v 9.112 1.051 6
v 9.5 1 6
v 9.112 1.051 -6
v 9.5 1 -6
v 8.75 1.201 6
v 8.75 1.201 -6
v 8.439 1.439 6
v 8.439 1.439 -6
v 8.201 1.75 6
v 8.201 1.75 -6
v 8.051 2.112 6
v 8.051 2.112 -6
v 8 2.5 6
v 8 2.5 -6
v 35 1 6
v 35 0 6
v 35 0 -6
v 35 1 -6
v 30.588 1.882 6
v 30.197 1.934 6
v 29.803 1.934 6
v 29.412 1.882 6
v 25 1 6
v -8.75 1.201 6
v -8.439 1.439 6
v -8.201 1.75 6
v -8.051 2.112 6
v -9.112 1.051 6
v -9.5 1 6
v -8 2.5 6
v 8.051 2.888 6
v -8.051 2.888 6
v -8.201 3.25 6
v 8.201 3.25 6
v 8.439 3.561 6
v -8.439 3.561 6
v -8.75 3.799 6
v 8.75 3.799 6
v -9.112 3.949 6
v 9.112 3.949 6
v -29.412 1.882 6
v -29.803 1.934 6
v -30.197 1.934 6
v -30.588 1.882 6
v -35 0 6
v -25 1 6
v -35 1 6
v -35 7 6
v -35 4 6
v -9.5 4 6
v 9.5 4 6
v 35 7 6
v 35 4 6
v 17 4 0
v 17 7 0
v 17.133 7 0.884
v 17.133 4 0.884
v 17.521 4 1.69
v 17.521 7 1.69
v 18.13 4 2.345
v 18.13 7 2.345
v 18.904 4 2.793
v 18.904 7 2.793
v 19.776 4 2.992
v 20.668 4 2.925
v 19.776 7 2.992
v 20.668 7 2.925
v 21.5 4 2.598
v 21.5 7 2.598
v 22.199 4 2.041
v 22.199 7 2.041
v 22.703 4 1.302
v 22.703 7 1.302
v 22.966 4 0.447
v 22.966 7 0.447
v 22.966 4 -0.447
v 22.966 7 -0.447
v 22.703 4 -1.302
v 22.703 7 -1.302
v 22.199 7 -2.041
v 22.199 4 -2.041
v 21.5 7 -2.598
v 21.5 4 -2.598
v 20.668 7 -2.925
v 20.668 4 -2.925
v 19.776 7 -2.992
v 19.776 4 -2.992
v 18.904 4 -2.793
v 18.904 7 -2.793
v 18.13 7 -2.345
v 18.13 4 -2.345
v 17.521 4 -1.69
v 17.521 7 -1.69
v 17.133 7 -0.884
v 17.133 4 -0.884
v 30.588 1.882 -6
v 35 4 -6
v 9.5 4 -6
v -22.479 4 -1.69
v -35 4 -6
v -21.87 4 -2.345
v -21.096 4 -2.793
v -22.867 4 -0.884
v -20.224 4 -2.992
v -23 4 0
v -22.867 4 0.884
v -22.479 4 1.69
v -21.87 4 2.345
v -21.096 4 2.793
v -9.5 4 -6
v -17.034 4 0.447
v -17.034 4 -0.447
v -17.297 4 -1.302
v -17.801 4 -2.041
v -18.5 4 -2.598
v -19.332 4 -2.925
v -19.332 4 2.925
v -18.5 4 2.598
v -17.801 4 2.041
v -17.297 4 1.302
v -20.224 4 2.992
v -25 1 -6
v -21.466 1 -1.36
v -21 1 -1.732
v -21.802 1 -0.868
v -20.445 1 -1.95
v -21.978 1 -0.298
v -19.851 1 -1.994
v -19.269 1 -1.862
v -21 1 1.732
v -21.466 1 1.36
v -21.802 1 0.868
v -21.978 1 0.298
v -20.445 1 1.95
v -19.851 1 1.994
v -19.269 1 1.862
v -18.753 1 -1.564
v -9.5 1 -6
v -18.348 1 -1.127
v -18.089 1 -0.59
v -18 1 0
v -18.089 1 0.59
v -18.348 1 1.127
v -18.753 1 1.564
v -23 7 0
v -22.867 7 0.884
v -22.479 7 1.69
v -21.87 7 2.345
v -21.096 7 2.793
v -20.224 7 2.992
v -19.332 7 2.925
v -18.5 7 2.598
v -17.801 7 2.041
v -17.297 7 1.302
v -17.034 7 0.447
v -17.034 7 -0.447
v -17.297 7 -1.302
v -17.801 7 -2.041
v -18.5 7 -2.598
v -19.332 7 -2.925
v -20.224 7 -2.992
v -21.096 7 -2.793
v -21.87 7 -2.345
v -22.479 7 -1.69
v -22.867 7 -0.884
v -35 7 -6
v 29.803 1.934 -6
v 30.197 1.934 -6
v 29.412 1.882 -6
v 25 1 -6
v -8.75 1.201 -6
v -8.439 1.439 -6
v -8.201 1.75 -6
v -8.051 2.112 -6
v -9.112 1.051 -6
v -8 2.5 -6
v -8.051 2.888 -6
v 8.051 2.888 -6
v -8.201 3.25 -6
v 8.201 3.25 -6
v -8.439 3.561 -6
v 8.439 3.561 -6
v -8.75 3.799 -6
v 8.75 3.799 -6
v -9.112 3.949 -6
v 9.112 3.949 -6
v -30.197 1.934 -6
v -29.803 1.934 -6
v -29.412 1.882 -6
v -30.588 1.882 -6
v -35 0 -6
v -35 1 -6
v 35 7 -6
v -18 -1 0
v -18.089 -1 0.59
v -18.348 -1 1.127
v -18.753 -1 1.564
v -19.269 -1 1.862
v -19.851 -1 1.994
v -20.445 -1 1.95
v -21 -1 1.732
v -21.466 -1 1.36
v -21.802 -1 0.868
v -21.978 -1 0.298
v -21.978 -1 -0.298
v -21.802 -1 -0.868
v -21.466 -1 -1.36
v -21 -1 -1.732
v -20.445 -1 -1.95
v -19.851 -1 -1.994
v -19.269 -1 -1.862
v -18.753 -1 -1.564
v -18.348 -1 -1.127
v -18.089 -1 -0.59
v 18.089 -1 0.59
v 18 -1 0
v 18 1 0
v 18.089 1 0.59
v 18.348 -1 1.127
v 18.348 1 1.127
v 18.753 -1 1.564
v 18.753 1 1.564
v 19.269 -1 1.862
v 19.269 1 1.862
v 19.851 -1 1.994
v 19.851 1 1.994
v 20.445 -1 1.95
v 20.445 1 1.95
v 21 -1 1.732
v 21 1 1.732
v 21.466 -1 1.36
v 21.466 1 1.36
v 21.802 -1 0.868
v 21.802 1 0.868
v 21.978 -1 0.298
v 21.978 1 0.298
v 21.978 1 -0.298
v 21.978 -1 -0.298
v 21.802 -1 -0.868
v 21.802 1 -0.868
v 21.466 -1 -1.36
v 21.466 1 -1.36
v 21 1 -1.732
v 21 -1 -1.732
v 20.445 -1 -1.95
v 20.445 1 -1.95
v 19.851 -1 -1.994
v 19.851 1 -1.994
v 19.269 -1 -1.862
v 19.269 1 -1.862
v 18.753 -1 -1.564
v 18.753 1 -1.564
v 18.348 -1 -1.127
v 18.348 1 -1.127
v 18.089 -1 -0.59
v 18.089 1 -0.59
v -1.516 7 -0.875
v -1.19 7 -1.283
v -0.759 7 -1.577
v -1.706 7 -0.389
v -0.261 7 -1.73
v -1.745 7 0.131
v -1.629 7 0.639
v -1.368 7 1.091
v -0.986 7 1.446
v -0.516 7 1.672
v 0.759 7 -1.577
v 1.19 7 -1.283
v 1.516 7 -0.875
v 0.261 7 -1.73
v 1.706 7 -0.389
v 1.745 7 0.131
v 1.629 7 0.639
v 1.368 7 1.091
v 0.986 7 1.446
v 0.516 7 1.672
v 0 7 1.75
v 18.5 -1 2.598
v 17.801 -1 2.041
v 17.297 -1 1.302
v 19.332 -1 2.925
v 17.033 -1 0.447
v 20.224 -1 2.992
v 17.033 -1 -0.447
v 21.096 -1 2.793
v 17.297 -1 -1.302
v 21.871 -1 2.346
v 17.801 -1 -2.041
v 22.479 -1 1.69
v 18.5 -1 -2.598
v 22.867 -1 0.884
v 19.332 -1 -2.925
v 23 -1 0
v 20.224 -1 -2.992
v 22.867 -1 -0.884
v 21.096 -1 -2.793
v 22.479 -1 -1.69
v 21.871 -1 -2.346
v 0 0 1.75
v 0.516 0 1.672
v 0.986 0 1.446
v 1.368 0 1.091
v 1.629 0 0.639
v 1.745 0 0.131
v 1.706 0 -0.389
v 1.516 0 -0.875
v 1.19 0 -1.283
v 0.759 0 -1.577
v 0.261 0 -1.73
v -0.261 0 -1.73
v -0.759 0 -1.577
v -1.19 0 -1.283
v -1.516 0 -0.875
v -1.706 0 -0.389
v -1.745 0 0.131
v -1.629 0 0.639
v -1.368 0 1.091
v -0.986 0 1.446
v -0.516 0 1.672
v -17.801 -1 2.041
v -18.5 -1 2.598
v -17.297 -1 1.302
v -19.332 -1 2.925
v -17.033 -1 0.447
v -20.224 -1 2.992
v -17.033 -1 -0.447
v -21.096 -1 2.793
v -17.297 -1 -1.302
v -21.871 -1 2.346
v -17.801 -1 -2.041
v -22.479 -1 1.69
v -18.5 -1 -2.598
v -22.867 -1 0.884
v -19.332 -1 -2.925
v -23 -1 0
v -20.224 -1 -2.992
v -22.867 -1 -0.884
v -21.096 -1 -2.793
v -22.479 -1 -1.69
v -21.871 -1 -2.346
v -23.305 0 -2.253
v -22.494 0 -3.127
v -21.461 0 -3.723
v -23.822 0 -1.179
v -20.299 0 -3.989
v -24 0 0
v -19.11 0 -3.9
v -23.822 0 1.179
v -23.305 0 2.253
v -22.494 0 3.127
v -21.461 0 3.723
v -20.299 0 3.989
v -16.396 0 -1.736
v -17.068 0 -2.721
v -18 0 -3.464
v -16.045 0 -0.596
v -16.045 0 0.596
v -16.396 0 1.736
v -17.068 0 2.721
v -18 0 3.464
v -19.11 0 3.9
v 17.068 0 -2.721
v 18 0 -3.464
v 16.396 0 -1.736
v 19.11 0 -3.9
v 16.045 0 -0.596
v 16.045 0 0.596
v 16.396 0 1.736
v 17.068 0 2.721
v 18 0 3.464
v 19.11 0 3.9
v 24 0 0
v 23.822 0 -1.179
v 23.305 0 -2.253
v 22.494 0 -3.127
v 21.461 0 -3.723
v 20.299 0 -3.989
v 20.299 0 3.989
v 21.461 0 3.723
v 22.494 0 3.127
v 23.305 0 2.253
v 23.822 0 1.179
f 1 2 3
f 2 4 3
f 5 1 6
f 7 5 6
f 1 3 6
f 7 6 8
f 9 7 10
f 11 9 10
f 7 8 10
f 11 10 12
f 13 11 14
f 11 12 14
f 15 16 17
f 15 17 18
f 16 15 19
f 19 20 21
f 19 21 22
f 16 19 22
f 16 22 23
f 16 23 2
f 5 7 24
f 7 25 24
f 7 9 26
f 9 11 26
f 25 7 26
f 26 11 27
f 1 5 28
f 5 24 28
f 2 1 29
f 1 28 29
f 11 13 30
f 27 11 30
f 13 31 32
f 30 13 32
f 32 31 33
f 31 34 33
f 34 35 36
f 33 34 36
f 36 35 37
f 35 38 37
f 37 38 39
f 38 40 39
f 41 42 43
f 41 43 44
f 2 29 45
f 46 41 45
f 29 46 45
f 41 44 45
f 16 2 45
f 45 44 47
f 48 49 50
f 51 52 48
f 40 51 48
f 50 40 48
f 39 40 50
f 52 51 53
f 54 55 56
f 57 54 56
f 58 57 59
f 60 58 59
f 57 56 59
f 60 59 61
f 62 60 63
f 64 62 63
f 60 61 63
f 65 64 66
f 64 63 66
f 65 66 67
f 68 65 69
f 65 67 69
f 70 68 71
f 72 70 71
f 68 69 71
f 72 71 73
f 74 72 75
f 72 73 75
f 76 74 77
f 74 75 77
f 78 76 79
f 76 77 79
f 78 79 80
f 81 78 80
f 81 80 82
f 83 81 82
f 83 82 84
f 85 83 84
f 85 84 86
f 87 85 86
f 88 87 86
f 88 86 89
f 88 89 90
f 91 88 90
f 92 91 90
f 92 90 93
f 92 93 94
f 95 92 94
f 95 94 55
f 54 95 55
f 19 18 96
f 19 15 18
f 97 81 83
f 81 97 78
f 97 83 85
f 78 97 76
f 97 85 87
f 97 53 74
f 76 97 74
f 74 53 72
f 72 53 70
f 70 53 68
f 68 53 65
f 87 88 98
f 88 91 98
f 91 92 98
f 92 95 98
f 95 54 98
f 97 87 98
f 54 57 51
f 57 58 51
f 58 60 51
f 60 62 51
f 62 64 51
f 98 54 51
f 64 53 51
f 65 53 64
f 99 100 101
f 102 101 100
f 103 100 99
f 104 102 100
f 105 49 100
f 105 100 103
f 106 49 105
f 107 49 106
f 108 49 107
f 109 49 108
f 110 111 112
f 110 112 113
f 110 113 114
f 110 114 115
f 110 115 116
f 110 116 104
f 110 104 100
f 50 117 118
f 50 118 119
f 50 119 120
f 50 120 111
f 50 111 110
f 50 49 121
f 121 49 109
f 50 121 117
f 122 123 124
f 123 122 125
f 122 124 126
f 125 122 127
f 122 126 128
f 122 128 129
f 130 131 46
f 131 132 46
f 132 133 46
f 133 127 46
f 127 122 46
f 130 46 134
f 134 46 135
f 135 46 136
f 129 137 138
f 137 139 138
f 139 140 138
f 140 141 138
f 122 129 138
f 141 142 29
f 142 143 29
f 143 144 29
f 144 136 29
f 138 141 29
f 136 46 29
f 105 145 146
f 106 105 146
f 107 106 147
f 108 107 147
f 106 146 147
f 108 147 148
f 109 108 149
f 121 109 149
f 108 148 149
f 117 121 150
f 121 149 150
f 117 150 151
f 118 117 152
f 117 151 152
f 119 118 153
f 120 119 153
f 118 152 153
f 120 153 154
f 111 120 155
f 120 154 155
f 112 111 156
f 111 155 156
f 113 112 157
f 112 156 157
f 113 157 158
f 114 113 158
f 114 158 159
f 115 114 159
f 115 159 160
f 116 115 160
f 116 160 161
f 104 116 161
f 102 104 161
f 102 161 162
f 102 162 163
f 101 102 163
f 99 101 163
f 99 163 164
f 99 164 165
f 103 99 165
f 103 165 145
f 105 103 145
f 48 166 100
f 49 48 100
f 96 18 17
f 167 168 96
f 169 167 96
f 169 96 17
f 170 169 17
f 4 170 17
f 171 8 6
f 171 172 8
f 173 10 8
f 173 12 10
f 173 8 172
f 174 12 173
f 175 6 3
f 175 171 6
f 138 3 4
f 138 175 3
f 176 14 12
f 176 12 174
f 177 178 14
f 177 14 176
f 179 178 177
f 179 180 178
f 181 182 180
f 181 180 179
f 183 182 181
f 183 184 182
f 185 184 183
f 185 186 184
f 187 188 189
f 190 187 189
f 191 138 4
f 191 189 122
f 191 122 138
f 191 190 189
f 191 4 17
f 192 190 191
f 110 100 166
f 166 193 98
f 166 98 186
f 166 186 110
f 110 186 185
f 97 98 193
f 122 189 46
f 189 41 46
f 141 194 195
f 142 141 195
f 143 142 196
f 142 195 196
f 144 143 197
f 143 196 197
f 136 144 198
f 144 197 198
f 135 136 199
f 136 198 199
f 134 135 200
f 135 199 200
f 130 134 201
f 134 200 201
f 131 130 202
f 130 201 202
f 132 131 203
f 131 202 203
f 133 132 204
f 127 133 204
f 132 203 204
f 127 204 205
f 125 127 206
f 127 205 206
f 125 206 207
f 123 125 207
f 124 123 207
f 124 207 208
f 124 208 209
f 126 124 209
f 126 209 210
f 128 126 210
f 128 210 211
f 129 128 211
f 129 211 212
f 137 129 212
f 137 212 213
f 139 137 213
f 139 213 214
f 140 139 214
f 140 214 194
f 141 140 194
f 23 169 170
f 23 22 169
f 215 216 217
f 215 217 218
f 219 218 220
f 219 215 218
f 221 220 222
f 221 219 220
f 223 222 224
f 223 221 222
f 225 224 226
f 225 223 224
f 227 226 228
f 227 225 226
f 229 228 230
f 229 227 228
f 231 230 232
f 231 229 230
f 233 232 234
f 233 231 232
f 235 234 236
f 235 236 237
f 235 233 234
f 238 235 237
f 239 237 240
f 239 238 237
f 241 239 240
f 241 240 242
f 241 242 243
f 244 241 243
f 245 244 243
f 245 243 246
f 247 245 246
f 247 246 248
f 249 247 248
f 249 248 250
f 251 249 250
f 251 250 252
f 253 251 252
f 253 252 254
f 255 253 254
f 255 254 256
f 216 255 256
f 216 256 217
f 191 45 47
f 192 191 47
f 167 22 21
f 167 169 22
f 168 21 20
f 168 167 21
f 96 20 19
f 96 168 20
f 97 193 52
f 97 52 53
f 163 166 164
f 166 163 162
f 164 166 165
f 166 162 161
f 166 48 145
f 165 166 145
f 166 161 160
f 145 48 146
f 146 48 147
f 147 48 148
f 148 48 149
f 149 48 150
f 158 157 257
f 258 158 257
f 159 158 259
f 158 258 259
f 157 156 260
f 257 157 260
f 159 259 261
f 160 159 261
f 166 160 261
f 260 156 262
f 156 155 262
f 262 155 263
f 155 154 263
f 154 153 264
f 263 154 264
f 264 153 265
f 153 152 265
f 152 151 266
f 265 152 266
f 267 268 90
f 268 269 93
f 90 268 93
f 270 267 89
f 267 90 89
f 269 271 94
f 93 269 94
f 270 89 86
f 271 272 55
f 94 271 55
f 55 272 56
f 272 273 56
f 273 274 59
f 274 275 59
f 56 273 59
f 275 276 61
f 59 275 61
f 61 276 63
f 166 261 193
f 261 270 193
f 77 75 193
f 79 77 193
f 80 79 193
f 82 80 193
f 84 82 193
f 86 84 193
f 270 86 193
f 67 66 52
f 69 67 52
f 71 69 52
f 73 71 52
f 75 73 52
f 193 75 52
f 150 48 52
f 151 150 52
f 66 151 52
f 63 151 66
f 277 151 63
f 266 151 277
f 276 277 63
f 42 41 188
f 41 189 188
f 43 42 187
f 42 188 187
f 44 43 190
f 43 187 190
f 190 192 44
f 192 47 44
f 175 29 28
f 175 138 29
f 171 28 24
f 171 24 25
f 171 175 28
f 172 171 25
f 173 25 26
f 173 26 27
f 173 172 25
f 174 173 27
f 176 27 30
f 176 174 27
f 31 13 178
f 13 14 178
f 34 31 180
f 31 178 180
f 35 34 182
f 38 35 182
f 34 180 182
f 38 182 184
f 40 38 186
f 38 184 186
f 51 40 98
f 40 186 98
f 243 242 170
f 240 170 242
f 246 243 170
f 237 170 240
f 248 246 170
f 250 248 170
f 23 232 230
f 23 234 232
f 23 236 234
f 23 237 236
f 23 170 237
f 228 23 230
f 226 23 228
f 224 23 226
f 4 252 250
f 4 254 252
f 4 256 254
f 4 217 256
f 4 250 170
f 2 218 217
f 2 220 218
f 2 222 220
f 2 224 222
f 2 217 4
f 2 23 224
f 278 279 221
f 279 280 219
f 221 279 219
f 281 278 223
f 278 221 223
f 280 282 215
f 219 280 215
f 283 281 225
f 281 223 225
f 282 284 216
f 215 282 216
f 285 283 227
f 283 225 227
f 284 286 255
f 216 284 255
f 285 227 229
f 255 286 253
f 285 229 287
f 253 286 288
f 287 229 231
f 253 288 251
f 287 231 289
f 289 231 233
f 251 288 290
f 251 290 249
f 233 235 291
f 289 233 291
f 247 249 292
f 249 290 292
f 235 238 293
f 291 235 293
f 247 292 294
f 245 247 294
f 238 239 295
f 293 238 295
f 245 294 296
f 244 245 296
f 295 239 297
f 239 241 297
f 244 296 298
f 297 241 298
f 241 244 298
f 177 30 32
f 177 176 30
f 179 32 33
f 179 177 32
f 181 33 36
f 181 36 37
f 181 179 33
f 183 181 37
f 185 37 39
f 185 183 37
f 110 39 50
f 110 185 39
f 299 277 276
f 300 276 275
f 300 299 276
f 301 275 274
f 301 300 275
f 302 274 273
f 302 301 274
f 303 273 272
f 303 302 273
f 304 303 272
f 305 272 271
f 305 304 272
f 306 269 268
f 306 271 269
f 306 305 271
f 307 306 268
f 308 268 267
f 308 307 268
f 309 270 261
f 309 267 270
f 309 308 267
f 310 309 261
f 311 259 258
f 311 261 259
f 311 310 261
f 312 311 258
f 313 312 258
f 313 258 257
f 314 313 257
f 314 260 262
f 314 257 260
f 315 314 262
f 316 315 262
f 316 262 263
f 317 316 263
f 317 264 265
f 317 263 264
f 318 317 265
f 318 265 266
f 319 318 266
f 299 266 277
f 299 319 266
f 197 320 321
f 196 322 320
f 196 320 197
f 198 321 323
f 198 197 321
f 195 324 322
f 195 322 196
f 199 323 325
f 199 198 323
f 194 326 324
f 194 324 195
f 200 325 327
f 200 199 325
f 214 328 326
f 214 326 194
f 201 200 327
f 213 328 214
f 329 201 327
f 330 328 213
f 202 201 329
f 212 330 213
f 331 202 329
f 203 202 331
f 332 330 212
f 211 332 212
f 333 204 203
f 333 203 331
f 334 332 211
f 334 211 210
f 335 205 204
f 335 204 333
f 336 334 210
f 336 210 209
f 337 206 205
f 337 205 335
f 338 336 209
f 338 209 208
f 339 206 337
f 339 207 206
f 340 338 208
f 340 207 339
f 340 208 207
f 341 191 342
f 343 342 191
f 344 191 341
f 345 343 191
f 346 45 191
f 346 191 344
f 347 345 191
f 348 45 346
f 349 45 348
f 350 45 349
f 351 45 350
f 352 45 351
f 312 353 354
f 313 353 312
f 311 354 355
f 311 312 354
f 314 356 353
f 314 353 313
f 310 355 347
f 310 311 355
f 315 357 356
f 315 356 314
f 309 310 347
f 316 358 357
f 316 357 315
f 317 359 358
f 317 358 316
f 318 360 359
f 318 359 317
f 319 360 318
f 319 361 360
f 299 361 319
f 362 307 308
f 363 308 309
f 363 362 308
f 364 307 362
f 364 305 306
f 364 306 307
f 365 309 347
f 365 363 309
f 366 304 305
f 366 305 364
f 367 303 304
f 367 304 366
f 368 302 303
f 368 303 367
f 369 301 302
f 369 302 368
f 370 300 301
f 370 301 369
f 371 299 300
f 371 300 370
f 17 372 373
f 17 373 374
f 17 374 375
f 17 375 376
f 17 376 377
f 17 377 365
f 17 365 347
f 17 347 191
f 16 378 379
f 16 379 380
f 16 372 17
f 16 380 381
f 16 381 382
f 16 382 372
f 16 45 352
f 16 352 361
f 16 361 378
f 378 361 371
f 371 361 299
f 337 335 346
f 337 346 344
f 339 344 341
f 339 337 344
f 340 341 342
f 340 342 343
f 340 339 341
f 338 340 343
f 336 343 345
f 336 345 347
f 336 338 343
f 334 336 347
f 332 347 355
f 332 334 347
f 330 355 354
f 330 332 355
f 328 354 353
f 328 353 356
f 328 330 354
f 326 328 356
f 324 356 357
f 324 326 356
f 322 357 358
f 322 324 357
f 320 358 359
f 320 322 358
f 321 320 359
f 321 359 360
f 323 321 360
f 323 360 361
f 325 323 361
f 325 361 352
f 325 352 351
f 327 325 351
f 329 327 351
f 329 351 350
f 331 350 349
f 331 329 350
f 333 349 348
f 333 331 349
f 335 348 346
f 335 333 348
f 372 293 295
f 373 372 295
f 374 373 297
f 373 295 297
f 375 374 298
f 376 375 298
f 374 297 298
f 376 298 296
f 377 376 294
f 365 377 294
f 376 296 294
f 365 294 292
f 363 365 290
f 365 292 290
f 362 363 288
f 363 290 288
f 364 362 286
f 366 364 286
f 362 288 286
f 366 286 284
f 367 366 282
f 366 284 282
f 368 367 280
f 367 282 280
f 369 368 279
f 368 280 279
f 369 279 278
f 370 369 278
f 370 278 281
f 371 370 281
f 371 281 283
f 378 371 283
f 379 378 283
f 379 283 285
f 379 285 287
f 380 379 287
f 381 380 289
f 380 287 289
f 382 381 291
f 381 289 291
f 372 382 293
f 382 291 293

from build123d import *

# Parameters (mm, degrees)
BOSS_EXTRUDE1_DEPTH = 6
SKETCH5_R           = 4
BOSS_EXTRUDE2_DEPTH = 1
BOSS_EXTRUDE3_DEPTH = 6
SKETCH6_R           = 2
CUT_EXTRUDE2_DEPTH  = 37.400549446
FILLET2_R           = 3
FILLET3_R           = 1.5
SKETCH3_R           = 1.75
CUT_EXTRUDE1_DEPTH  = 37.193922142
CUT_EXTRUDE3_REACH  = 38.401
SKETCH8_R           = 3
CHAMFER1_SIZE       = 1


with BuildPart() as part:
    # Sketch1 → Boss-Extrude1 (new, symmetric)
    with BuildSketch(Plane.XY):
        Polygon((-35, 0), (-35, 1), (-30, 2), (-25, 1), (0, 1), (0, 0), align=None)
    extrude(amount=BOSS_EXTRUDE1_DEPTH, both=True)

    # Sketch5 → Boss-Extrude2 (add)
    with BuildSketch(Plane.XZ):
        with Locations(Location((-20, 0, 0), (0, 0, 180))):
            Circle(SKETCH5_R)
    extrude(amount=BOSS_EXTRUDE2_DEPTH)

    # Sketch7 → Boss-Extrude3 (add, symmetric)
    with BuildSketch(Plane.XY):
        Polygon((0, 1), (0, 7), (-35, 7), (-35, 4), (-8, 4), (-8, 1), align=None)
    extrude(amount=BOSS_EXTRUDE3_DEPTH, both=True)

    # Sketch6 → Cut-Extrude2 (cut, through all)
    with BuildSketch(Plane.XZ.offset(1)):
        with Locations((-20, 0)):
            Circle(SKETCH6_R)
    extrude(amount=-CUT_EXTRUDE2_DEPTH, mode=Mode.SUBTRACT)

    # Fillet2
    fillet2_edges = [part.edges().sort_by_distance(p)[0] for p in [
        (-30, 2, 0),
    ]]
    fillet(fillet2_edges, radius=FILLET2_R)

    # Fillet3
    fillet3_edges = [part.edges().sort_by_distance(p)[0] for p in [
        (-8, 4, 0),
        (-8, 1, 0),
    ]]
    fillet(fillet3_edges, radius=FILLET3_R - 0.0001)  # a hair under: the kernel refuses the full size

    # Mirror1: part across plane


with BuildPart() as part_1:
    add(part.part)
    add(part.part.mirror(Plane(origin=(0, 0, 0), x_dir=(0, 0, 1), z_dir=(1, 0, 0))))

    # Sketch3 → Cut-Extrude1 (cut, through all)
    with BuildSketch(Plane(origin=(0, 0, 0), x_dir=(1, 0, 0), z_dir=(0, 1, 0))):
        with Locations(Location((0, 0, 0), (0, 0, 270))):
            Circle(SKETCH3_R)
    extrude(amount=CUT_EXTRUDE1_DEPTH, mode=Mode.SUBTRACT)

    # Sketch8 → Cut-Extrude3 (cut, up to next)
    with BuildSketch(Plane(origin=(0, 7, 0), x_dir=(1, 0, 0), z_dir=(0, 1, 0)), mode=Mode.PRIVATE) as cut_extrude3_sk1:
        with Locations(Location((20, 0, 0), (0, 0, 180))):
            Circle(SKETCH8_R)
    cut_extrude3_tool1 = extrude(cut_extrude3_sk1.sketch, amount=-CUT_EXTRUDE3_REACH, mode=Mode.PRIVATE) & part_1.part
    # Sketch8 → Cut-Extrude3 (cut, up to next)
    with BuildSketch(Plane(origin=(0, 7, 0), x_dir=(1, 0, 0), z_dir=(0, 1, 0)), mode=Mode.PRIVATE) as cut_extrude3_sk2:
        with Locations(Location((-20, 0, 0), (0, 0, 180))):
            Circle(SKETCH8_R)
    cut_extrude3_tool2 = extrude(cut_extrude3_sk2.sketch, amount=-CUT_EXTRUDE3_REACH, mode=Mode.PRIVATE) & part_1.part
    add(cut_extrude3_tool1.solids().sort_by_distance((20, 7, 0))[0], mode=Mode.SUBTRACT)
    add(cut_extrude3_tool2.solids().sort_by_distance((-20, 7, 0))[0], mode=Mode.SUBTRACT)

    # Chamfer1
    chamfer1_edges = [part_1.edges().sort_by_distance(p)[0] for p in [
        (-16, -1, 0),
        (16, -1, 0),
    ]]
    chamfer(chamfer1_edges, length=CHAMFER1_SIZE - 0.0001)  # a hair under: the kernel refuses the full size


solid = part_1.part
